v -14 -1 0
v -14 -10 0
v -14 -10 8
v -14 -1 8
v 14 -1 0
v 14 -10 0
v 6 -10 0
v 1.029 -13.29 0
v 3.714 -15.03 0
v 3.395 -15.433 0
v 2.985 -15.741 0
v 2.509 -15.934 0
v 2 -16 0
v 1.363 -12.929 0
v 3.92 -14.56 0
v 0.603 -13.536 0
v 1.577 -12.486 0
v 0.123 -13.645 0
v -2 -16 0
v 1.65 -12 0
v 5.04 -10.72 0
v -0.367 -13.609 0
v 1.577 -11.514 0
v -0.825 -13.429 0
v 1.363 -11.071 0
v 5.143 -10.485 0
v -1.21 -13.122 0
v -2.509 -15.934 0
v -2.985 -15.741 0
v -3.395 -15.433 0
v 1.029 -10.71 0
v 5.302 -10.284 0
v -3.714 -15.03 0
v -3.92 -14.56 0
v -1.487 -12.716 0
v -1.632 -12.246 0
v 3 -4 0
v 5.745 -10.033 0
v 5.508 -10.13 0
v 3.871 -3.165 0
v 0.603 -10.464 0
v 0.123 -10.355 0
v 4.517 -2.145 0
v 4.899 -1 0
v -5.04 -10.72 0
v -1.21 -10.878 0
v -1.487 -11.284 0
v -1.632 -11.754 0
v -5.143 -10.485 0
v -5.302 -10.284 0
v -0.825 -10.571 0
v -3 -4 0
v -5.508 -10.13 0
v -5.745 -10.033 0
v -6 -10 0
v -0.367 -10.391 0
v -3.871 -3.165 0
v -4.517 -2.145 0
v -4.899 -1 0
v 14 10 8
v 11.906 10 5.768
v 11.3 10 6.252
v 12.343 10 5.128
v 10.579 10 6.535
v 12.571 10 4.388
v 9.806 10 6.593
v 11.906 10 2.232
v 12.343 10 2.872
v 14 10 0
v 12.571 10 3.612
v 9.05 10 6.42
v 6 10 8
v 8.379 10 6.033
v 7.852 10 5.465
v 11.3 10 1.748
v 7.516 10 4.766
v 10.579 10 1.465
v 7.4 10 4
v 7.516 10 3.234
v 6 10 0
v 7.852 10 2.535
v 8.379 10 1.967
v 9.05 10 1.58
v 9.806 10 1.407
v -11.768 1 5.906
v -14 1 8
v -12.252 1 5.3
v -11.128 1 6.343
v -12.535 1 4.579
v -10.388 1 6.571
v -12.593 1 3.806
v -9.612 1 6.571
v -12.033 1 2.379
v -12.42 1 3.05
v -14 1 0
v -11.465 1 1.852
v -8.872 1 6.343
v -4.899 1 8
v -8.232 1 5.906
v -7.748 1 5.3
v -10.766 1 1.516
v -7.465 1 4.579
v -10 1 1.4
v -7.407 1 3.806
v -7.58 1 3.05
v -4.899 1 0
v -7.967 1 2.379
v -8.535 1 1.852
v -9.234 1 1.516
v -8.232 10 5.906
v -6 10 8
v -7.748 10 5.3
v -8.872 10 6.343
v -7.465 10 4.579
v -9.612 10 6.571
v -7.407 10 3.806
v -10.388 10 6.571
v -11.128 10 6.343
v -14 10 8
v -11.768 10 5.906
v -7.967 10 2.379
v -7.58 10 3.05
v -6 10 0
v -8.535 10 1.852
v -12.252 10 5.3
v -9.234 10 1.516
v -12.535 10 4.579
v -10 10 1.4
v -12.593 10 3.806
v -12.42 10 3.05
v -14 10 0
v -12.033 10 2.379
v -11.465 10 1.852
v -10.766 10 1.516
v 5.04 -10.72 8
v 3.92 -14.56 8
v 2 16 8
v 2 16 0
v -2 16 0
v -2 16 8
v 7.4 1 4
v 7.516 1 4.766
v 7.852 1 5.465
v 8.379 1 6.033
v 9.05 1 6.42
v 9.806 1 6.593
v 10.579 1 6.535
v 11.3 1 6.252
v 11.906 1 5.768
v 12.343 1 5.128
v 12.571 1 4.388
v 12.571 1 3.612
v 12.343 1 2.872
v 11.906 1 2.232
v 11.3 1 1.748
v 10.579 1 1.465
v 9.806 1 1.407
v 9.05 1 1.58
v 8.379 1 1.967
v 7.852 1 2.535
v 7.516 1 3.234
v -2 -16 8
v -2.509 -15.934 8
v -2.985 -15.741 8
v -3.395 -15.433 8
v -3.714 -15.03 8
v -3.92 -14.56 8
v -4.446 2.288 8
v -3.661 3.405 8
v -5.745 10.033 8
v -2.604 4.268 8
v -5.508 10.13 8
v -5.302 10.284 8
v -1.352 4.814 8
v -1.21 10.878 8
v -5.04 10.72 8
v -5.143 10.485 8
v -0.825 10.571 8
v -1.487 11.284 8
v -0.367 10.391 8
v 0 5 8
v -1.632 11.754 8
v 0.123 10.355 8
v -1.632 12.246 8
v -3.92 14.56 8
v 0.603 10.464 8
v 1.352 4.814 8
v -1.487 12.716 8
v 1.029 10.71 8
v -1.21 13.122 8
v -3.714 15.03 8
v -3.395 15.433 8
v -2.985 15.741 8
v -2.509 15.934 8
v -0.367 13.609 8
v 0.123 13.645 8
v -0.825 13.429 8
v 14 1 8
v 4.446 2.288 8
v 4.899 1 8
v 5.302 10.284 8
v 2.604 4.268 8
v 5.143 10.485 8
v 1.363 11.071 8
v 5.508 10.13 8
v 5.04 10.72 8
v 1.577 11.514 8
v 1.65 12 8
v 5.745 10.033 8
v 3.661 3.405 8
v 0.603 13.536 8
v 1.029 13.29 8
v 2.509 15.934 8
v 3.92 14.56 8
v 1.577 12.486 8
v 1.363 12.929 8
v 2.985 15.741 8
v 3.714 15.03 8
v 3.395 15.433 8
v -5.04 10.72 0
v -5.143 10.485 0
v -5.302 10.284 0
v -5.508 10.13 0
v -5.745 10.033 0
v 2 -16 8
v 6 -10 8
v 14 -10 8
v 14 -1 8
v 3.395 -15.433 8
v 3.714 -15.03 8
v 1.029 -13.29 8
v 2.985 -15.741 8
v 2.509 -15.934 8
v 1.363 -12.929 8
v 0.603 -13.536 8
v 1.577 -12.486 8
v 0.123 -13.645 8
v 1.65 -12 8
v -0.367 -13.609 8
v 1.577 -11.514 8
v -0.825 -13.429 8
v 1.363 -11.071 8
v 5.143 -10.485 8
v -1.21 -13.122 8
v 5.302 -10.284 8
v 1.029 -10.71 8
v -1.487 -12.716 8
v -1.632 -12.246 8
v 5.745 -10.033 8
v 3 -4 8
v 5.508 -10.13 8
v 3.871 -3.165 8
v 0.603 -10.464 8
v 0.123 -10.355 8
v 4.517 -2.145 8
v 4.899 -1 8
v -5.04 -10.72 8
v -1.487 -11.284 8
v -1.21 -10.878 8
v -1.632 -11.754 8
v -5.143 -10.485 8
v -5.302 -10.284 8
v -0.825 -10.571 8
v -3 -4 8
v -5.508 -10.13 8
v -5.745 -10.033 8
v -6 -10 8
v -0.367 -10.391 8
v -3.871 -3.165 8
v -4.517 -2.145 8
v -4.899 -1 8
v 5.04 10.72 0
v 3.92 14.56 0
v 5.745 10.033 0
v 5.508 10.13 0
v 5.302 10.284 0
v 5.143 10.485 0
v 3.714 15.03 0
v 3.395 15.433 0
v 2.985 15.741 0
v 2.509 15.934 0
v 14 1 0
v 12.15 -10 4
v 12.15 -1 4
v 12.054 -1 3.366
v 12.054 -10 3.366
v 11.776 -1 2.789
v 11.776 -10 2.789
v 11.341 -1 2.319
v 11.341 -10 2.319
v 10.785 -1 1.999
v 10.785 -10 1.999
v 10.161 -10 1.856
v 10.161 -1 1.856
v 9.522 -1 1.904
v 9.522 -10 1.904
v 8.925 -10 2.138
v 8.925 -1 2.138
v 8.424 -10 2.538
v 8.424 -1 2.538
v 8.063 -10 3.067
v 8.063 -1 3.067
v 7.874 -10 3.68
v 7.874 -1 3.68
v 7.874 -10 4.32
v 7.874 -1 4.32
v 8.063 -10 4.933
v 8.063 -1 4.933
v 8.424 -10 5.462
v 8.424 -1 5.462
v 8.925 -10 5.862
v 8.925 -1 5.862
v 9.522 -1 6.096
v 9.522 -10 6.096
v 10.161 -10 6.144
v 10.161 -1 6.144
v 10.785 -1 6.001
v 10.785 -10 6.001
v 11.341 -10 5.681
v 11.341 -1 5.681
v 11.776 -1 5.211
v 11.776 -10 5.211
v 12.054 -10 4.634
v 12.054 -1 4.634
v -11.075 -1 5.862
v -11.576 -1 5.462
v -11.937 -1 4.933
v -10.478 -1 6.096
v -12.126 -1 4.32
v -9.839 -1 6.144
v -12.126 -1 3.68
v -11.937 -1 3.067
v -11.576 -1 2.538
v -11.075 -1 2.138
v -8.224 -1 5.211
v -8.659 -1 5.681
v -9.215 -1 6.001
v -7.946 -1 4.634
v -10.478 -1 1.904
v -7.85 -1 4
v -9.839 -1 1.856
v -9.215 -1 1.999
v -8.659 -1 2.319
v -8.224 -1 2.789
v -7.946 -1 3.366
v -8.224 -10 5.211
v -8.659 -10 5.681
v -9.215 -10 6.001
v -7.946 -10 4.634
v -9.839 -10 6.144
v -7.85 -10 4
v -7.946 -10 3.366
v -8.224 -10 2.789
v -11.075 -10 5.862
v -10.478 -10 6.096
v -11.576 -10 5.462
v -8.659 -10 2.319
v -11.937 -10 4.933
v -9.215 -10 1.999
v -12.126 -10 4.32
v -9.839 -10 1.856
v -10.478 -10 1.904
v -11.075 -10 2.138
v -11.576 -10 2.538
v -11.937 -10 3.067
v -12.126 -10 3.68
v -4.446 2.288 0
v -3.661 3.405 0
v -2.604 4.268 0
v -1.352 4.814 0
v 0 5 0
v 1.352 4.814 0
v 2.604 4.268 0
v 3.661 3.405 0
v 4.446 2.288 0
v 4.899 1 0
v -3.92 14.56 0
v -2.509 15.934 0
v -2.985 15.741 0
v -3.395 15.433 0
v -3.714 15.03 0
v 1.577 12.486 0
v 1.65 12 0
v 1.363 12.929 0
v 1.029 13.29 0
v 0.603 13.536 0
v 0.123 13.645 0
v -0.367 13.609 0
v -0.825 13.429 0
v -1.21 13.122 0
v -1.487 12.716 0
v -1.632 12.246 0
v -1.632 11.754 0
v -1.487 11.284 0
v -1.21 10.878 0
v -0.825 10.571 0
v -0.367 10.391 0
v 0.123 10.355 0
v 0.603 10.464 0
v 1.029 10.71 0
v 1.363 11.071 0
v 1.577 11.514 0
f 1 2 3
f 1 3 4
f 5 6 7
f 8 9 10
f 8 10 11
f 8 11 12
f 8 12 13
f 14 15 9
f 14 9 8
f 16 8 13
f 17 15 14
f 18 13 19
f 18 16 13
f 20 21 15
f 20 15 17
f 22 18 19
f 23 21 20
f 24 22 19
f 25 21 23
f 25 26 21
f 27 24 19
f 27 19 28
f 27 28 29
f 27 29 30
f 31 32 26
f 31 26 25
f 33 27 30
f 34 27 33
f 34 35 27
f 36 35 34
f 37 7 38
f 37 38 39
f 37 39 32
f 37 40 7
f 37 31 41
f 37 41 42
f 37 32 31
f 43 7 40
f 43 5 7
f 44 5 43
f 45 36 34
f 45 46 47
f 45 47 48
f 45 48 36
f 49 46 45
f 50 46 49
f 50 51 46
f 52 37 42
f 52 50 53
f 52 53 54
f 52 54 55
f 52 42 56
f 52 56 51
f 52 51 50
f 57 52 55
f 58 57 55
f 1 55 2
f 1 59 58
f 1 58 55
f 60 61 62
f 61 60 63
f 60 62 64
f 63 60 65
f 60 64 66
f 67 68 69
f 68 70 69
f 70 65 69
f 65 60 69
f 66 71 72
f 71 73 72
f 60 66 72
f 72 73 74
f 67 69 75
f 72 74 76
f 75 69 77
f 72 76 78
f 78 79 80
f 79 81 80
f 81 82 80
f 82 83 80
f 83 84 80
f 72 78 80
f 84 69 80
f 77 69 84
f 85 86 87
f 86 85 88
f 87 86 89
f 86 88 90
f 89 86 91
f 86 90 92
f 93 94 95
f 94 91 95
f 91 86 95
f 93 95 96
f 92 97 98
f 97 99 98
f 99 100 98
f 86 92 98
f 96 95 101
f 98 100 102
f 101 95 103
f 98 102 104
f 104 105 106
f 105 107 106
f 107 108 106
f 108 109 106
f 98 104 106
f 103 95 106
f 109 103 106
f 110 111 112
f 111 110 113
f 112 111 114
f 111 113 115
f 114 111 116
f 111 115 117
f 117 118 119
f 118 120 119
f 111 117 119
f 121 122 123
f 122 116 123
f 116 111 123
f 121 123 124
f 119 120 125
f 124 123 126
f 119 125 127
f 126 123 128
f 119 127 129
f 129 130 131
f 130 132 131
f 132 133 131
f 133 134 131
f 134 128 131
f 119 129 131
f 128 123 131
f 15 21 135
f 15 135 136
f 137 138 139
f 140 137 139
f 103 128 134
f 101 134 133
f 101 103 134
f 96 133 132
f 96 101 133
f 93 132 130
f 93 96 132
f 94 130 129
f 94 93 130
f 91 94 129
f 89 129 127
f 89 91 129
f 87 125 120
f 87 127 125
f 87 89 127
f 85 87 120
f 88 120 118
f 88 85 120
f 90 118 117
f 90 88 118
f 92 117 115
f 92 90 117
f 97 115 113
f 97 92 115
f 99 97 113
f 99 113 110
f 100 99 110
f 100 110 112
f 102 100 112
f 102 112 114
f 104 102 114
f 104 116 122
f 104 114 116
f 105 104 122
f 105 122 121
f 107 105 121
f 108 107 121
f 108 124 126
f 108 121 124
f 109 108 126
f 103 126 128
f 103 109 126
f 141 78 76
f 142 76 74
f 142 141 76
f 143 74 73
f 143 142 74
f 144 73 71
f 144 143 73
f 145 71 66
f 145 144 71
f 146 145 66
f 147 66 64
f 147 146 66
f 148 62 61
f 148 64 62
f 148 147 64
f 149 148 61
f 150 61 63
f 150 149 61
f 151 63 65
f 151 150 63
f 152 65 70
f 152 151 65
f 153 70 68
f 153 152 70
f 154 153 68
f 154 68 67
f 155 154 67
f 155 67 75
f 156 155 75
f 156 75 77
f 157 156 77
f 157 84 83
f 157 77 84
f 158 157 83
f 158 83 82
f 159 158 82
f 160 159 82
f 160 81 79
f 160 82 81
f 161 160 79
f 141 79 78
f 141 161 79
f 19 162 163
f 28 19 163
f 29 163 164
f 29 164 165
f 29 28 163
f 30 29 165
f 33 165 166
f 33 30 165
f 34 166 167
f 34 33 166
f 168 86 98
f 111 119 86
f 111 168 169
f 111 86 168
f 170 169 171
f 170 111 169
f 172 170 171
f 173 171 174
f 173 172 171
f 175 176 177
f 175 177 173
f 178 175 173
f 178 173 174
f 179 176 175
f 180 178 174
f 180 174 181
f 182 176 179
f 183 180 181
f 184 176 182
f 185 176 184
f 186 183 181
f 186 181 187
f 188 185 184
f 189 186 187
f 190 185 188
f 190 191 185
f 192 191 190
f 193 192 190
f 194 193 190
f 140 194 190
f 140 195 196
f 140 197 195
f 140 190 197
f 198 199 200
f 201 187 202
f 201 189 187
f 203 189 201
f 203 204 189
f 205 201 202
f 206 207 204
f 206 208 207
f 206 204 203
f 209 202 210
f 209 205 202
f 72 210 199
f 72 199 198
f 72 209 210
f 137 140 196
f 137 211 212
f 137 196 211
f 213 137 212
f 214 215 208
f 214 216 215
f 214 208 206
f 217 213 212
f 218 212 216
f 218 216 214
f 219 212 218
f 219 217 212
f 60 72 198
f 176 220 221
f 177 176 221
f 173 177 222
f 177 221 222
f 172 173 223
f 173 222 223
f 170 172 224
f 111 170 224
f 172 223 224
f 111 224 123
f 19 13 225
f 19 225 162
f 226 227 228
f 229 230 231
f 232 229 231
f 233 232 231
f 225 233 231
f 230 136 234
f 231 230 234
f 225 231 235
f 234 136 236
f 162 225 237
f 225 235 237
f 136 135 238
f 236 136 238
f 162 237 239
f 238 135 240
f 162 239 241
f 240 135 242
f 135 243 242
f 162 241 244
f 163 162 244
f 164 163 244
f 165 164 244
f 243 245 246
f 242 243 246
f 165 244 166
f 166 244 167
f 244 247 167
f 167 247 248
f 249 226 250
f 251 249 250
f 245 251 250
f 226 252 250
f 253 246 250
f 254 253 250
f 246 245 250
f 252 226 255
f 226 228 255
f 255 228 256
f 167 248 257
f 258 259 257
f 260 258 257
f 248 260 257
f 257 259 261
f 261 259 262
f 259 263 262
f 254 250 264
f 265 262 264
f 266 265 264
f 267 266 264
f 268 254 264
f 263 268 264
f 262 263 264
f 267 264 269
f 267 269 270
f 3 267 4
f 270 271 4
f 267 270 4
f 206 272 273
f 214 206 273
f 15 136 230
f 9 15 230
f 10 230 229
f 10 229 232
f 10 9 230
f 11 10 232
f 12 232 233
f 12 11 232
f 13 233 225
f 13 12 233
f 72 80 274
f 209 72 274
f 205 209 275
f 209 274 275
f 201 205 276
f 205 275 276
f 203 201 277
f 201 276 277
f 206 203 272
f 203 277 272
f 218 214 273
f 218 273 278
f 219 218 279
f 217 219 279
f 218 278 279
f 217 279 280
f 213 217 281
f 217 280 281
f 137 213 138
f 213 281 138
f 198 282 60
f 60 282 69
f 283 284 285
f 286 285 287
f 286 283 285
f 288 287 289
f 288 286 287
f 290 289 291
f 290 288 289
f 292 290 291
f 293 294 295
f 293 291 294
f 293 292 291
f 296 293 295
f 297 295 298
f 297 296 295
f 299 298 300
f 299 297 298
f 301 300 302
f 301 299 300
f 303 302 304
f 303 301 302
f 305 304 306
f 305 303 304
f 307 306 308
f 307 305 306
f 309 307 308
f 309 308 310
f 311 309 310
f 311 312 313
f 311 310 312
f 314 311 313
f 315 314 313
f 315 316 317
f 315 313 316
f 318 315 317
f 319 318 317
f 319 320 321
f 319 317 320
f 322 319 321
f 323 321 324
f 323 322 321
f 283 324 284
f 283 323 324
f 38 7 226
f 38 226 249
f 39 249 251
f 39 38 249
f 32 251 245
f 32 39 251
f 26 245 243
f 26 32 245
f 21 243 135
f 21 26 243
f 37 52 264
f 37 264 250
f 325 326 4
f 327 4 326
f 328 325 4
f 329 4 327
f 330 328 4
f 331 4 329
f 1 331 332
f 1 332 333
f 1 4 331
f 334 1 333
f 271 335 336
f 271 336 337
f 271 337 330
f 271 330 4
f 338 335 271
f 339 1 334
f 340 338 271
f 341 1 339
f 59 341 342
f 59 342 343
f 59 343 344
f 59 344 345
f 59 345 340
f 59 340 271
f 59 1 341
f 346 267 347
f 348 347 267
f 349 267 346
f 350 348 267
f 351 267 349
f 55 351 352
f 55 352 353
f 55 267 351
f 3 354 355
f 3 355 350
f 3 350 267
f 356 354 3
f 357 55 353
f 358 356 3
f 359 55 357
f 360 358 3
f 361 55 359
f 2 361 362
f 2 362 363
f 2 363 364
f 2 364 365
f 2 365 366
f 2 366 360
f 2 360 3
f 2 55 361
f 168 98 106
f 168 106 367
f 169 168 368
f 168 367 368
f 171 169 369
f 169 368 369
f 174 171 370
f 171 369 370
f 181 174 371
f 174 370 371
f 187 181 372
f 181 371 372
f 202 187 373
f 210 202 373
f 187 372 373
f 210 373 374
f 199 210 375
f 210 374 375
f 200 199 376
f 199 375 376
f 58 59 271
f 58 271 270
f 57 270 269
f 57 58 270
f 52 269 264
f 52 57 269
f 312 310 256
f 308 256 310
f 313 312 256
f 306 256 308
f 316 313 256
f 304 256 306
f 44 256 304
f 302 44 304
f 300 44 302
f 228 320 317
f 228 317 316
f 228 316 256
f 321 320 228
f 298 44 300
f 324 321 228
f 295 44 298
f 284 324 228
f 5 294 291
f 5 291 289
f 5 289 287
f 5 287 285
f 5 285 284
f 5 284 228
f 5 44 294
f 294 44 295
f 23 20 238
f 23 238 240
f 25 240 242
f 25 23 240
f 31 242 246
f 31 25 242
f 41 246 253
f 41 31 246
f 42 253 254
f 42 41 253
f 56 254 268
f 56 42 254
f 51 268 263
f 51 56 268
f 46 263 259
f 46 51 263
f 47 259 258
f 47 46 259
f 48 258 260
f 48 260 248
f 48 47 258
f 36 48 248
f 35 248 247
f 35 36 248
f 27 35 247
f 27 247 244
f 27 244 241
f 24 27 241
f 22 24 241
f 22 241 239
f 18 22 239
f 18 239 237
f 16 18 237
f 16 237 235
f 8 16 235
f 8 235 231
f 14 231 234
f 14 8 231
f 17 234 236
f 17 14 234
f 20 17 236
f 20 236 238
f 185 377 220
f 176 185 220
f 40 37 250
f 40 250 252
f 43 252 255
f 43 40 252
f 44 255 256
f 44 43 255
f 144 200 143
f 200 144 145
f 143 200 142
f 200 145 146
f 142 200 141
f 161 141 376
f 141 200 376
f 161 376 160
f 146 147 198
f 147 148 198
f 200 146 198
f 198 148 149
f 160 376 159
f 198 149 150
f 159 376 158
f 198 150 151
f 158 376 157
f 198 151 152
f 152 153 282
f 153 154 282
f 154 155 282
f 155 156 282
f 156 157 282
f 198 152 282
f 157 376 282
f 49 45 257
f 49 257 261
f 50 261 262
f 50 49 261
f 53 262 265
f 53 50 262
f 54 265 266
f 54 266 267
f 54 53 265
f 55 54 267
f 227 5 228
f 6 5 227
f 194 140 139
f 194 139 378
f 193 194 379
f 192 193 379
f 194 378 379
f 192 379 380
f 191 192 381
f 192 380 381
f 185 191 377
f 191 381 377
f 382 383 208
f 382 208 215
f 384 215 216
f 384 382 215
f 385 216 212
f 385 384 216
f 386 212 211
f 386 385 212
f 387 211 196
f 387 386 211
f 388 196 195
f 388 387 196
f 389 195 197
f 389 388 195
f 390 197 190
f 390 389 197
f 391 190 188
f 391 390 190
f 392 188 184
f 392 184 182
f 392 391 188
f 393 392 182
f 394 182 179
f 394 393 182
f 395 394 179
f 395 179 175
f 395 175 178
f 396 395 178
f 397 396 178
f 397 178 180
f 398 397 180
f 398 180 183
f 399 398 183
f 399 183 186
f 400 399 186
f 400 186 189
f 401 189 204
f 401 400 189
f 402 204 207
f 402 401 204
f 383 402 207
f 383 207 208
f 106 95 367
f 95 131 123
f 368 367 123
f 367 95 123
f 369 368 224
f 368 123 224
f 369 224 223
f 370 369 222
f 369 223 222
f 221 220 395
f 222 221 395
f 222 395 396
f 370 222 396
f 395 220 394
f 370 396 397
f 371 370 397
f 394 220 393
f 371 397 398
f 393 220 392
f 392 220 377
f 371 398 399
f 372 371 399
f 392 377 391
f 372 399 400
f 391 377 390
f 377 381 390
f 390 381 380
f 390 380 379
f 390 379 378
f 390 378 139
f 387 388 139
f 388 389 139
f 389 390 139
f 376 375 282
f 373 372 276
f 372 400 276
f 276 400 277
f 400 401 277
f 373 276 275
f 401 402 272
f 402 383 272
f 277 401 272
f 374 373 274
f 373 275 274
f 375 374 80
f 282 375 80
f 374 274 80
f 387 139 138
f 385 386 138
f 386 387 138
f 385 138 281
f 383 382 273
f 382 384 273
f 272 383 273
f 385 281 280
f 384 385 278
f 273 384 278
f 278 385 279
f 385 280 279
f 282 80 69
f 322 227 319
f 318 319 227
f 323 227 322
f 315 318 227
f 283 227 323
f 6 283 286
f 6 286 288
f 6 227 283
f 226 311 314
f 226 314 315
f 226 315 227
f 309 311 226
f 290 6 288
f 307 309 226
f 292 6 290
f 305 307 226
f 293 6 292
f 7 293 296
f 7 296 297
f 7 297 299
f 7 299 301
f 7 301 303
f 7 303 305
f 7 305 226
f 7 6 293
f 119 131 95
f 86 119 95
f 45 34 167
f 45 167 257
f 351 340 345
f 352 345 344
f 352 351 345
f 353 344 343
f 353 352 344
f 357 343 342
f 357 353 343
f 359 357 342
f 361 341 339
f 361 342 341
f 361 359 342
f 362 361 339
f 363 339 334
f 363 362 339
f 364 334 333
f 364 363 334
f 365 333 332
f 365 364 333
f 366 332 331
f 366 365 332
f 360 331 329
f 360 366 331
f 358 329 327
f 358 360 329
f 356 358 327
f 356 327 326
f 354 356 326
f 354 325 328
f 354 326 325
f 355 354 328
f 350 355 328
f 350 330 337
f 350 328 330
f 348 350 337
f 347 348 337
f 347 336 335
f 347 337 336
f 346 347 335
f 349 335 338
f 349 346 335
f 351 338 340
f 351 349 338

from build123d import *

# Parameters (mm, degrees)
SKETCH_1_R               = 1.65
EXTRUDE_1_DEPTH          = 8
EXTRUDE_1_2_DEPTH        = 8
CUT_EXTRUDE_2_DEPTH      = 31.594117082
CUT_EXTRUDE_2_DEPTH_BACK = 9
SKETCH_3_R               = 2.6
SKETCH_4_R               = 2.15
CUT_EXTRUDE_3_DEPTH      = 31.594117082


with BuildPart() as part:
    # 草图1 → 凸台-拉伸1 (new body)
    with BuildSketch(Plane.XY):
        with BuildLine():
            Line((-3, -4), (3, -4))
            ThreePointArc((3, -4), (4.224744871, -2.674234614), (4.898979486, -1))
            Line((4.898979486, -1), (14, -1))
            Line((14, -1), (14, -10))
            Line((14, -10), (6, -10))
            ThreePointArc((6, -10), (5.4, -10.2), (5.04, -10.72))
            Line((5.04, -10.72), (3.92, -14.56))
            ThreePointArc((3.92, -14.56), (3.2, -15.6), (2, -16))
            Line((2, -16), (-2, -16))
            ThreePointArc((-2, -16), (-3.2, -15.6), (-3.92, -14.56))
            Line((-3.92, -14.56), (-5.04, -10.72))
            ThreePointArc((-5.04, -10.72), (-5.4, -10.2), (-6, -10))
            Line((-6, -10), (-14, -10))
            Line((-14, -10), (-14, -1))
            Line((-14, -1), (-4.898979486, -1))
            ThreePointArc((-4.898979486, -1), (-4.224744871, -2.674234614), (-3, -4))
        make_face()
        with Locations((0, -12)):
            Circle(SKETCH_1_R, mode=Mode.SUBTRACT)
    extrude(amount=EXTRUDE_1_DEPTH)

    # 草图4 → 切除-拉伸3 (cut, through all)
    with BuildSketch(Plane(origin=(0, -10, 0), x_dir=(1, 0, 0), z_dir=(0, 1, 0))):
        with Locations((10, -4)):
            Circle(SKETCH_4_R)
        with Locations((-10, -4)):
            Circle(SKETCH_4_R)
    extrude(amount=CUT_EXTRUDE_3_DEPTH, mode=Mode.SUBTRACT)


with BuildPart() as body_2:
    # 草图1 → Extrude 1 2 (new body)
    with BuildSketch(Plane.XY):
        with BuildLine():
            Line((-3.92, 14.56), (-5.04, 10.72))
            ThreePointArc((-5.04, 10.72), (-5.4, 10.2), (-6, 10))
            Line((-6, 10), (-14, 10))
            Line((-14, 10), (-14, 1))
            Line((-14, 1), (-4.898979486, 1))
            ThreePointArc((-4.898979486, 1), (0, 5), (4.898979486, 1))
            Line((4.898979486, 1), (14, 1))
            Line((14, 1), (14, 10))
            Line((14, 10), (6, 10))
            ThreePointArc((6, 10), (5.4, 10.2), (5.04, 10.72))
            Line((5.04, 10.72), (3.92, 14.56))
            ThreePointArc((3.92, 14.56), (3.2, 15.6), (2, 16))
            Line((2, 16), (-2, 16))
            ThreePointArc((-2, 16), (-3.2, 15.6), (-3.92, 14.56))
        make_face()
        with Locations((0, 12)):
            Circle(SKETCH_1_R, mode=Mode.SUBTRACT)
    extrude(amount=EXTRUDE_1_2_DEPTH)

    # 草图3 → 切除-拉伸2 (cut, two sides: drawn at the far end of the back side and taken through both)
    with BuildSketch(Plane(origin=(0, 10, 0), x_dir=(1, 0, 0), z_dir=(0, 1, 0)).offset(-CUT_EXTRUDE_2_DEPTH_BACK)):
        with Locations(Location((10, -4, 0), (0, 0, 180))):
            Circle(SKETCH_3_R)
        with Locations(Location((-10, -4, 0), (0, 0, 90))):
            Circle(SKETCH_3_R)
    extrude(amount=CUT_EXTRUDE_2_DEPTH + CUT_EXTRUDE_2_DEPTH_BACK, mode=Mode.SUBTRACT)


solid = Compound([part.part, body_2.part])
